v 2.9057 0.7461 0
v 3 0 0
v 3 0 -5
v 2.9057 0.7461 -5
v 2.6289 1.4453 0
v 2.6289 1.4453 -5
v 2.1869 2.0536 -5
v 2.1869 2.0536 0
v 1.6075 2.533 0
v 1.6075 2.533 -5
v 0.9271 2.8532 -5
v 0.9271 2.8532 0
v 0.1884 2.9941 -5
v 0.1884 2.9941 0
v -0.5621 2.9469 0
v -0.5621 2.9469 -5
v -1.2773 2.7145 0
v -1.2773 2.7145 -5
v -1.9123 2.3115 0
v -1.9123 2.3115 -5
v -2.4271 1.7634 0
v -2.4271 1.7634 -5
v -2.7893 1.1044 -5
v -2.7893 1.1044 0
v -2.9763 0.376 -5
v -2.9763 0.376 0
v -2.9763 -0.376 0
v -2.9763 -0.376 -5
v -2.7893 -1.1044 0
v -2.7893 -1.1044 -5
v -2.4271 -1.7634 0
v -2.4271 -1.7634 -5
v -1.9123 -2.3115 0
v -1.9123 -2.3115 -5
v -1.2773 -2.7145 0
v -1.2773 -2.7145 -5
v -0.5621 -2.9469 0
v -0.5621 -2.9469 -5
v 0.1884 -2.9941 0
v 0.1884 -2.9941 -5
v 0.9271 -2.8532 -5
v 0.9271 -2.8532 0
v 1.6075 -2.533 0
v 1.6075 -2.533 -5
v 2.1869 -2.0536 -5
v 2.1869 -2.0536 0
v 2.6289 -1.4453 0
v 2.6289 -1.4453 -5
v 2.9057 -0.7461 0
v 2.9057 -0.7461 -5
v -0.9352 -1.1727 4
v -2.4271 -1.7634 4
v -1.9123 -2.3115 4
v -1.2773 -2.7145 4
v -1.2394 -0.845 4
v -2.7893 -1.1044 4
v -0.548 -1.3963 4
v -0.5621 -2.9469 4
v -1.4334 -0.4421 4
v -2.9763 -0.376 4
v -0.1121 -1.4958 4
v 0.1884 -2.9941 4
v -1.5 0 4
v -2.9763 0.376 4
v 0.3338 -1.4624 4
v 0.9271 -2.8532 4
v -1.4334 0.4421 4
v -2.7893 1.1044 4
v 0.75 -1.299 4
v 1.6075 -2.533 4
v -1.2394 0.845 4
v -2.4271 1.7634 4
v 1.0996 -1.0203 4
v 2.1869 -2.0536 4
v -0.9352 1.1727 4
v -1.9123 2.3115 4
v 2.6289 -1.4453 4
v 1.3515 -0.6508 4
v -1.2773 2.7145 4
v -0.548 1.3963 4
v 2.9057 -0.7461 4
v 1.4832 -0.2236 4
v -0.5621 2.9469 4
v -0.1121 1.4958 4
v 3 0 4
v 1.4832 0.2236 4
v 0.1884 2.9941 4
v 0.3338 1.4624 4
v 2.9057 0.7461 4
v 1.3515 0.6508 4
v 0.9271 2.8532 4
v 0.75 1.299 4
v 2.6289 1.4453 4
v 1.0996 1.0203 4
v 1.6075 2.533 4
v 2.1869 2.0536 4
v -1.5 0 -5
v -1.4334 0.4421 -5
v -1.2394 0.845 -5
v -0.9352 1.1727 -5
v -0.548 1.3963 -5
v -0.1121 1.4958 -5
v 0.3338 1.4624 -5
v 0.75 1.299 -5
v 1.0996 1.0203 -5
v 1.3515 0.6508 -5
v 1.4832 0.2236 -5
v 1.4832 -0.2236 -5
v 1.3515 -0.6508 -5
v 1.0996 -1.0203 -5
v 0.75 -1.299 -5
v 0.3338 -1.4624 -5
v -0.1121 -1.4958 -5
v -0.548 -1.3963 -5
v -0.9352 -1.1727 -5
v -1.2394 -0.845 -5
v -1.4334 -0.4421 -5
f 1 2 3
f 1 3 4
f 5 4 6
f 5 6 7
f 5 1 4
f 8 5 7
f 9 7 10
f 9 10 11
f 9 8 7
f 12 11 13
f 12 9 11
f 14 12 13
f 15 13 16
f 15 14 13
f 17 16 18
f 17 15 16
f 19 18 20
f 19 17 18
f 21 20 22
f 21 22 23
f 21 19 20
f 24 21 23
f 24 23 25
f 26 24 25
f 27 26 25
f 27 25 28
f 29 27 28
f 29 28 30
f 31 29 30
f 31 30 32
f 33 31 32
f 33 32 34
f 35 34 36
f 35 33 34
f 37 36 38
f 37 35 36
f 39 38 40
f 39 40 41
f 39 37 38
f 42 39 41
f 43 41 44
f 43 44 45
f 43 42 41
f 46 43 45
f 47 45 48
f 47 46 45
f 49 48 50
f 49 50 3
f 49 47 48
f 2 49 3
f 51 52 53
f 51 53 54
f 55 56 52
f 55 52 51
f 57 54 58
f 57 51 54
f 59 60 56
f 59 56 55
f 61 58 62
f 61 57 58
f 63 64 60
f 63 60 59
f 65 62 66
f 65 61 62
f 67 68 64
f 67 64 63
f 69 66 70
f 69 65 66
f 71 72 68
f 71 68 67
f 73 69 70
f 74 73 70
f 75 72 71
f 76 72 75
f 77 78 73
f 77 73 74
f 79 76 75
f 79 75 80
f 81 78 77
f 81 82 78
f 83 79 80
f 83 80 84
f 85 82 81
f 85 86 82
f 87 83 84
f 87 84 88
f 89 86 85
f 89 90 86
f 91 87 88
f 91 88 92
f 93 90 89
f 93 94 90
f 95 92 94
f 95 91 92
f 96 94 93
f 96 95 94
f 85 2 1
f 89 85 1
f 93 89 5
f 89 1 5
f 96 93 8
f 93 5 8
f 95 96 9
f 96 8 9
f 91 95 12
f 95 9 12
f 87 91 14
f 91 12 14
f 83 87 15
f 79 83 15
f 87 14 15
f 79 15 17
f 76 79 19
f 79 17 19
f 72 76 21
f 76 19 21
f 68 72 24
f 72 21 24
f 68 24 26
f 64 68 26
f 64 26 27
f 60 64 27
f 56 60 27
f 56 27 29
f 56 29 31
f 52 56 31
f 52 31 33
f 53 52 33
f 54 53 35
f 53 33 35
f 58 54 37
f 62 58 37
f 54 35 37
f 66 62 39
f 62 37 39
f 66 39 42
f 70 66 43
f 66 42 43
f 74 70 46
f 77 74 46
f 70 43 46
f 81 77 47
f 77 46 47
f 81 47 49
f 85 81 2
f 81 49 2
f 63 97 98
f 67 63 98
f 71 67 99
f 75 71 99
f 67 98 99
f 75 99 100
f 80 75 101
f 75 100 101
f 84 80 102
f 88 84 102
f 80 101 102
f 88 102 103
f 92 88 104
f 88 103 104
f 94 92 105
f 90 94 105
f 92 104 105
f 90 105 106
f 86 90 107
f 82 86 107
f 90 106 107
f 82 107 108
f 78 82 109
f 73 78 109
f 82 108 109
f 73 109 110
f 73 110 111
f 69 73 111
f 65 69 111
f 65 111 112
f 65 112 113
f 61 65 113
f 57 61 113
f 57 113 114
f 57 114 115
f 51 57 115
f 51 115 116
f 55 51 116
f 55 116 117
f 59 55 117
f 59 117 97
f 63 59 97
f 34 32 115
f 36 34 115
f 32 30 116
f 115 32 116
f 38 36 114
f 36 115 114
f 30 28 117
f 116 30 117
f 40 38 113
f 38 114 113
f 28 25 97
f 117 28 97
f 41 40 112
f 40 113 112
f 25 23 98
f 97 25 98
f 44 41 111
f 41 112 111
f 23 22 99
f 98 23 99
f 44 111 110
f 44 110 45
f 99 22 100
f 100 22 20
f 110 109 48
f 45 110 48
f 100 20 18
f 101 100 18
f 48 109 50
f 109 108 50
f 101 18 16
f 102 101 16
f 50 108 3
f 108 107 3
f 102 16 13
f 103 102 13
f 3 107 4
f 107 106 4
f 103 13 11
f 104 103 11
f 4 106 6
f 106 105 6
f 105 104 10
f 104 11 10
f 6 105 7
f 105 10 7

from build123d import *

# Parameters (mm, degrees)
F0_R     = 3
F1_DEPTH = 5
F2_R     = 3
F3_DEPTH = 4
F5_D     = 3
F5_DEPTH = 15


with BuildPart() as f1:
    # F0 (on Top) → F1 (new body)
    with BuildSketch(Plane.XY):
        Circle(F0_R)
    extrude(amount=-F1_DEPTH)

    # F2 (on Top) → F3 (join)
    with BuildSketch(Plane.XY):
        Circle(F2_R)
    extrude(amount=F3_DEPTH)

    # F5
    with Locations(Plane.XY.offset(4)):
        with Locations((0, 0)):
            Hole(F5_D / 2, depth=F5_DEPTH)


solid = f1.part
